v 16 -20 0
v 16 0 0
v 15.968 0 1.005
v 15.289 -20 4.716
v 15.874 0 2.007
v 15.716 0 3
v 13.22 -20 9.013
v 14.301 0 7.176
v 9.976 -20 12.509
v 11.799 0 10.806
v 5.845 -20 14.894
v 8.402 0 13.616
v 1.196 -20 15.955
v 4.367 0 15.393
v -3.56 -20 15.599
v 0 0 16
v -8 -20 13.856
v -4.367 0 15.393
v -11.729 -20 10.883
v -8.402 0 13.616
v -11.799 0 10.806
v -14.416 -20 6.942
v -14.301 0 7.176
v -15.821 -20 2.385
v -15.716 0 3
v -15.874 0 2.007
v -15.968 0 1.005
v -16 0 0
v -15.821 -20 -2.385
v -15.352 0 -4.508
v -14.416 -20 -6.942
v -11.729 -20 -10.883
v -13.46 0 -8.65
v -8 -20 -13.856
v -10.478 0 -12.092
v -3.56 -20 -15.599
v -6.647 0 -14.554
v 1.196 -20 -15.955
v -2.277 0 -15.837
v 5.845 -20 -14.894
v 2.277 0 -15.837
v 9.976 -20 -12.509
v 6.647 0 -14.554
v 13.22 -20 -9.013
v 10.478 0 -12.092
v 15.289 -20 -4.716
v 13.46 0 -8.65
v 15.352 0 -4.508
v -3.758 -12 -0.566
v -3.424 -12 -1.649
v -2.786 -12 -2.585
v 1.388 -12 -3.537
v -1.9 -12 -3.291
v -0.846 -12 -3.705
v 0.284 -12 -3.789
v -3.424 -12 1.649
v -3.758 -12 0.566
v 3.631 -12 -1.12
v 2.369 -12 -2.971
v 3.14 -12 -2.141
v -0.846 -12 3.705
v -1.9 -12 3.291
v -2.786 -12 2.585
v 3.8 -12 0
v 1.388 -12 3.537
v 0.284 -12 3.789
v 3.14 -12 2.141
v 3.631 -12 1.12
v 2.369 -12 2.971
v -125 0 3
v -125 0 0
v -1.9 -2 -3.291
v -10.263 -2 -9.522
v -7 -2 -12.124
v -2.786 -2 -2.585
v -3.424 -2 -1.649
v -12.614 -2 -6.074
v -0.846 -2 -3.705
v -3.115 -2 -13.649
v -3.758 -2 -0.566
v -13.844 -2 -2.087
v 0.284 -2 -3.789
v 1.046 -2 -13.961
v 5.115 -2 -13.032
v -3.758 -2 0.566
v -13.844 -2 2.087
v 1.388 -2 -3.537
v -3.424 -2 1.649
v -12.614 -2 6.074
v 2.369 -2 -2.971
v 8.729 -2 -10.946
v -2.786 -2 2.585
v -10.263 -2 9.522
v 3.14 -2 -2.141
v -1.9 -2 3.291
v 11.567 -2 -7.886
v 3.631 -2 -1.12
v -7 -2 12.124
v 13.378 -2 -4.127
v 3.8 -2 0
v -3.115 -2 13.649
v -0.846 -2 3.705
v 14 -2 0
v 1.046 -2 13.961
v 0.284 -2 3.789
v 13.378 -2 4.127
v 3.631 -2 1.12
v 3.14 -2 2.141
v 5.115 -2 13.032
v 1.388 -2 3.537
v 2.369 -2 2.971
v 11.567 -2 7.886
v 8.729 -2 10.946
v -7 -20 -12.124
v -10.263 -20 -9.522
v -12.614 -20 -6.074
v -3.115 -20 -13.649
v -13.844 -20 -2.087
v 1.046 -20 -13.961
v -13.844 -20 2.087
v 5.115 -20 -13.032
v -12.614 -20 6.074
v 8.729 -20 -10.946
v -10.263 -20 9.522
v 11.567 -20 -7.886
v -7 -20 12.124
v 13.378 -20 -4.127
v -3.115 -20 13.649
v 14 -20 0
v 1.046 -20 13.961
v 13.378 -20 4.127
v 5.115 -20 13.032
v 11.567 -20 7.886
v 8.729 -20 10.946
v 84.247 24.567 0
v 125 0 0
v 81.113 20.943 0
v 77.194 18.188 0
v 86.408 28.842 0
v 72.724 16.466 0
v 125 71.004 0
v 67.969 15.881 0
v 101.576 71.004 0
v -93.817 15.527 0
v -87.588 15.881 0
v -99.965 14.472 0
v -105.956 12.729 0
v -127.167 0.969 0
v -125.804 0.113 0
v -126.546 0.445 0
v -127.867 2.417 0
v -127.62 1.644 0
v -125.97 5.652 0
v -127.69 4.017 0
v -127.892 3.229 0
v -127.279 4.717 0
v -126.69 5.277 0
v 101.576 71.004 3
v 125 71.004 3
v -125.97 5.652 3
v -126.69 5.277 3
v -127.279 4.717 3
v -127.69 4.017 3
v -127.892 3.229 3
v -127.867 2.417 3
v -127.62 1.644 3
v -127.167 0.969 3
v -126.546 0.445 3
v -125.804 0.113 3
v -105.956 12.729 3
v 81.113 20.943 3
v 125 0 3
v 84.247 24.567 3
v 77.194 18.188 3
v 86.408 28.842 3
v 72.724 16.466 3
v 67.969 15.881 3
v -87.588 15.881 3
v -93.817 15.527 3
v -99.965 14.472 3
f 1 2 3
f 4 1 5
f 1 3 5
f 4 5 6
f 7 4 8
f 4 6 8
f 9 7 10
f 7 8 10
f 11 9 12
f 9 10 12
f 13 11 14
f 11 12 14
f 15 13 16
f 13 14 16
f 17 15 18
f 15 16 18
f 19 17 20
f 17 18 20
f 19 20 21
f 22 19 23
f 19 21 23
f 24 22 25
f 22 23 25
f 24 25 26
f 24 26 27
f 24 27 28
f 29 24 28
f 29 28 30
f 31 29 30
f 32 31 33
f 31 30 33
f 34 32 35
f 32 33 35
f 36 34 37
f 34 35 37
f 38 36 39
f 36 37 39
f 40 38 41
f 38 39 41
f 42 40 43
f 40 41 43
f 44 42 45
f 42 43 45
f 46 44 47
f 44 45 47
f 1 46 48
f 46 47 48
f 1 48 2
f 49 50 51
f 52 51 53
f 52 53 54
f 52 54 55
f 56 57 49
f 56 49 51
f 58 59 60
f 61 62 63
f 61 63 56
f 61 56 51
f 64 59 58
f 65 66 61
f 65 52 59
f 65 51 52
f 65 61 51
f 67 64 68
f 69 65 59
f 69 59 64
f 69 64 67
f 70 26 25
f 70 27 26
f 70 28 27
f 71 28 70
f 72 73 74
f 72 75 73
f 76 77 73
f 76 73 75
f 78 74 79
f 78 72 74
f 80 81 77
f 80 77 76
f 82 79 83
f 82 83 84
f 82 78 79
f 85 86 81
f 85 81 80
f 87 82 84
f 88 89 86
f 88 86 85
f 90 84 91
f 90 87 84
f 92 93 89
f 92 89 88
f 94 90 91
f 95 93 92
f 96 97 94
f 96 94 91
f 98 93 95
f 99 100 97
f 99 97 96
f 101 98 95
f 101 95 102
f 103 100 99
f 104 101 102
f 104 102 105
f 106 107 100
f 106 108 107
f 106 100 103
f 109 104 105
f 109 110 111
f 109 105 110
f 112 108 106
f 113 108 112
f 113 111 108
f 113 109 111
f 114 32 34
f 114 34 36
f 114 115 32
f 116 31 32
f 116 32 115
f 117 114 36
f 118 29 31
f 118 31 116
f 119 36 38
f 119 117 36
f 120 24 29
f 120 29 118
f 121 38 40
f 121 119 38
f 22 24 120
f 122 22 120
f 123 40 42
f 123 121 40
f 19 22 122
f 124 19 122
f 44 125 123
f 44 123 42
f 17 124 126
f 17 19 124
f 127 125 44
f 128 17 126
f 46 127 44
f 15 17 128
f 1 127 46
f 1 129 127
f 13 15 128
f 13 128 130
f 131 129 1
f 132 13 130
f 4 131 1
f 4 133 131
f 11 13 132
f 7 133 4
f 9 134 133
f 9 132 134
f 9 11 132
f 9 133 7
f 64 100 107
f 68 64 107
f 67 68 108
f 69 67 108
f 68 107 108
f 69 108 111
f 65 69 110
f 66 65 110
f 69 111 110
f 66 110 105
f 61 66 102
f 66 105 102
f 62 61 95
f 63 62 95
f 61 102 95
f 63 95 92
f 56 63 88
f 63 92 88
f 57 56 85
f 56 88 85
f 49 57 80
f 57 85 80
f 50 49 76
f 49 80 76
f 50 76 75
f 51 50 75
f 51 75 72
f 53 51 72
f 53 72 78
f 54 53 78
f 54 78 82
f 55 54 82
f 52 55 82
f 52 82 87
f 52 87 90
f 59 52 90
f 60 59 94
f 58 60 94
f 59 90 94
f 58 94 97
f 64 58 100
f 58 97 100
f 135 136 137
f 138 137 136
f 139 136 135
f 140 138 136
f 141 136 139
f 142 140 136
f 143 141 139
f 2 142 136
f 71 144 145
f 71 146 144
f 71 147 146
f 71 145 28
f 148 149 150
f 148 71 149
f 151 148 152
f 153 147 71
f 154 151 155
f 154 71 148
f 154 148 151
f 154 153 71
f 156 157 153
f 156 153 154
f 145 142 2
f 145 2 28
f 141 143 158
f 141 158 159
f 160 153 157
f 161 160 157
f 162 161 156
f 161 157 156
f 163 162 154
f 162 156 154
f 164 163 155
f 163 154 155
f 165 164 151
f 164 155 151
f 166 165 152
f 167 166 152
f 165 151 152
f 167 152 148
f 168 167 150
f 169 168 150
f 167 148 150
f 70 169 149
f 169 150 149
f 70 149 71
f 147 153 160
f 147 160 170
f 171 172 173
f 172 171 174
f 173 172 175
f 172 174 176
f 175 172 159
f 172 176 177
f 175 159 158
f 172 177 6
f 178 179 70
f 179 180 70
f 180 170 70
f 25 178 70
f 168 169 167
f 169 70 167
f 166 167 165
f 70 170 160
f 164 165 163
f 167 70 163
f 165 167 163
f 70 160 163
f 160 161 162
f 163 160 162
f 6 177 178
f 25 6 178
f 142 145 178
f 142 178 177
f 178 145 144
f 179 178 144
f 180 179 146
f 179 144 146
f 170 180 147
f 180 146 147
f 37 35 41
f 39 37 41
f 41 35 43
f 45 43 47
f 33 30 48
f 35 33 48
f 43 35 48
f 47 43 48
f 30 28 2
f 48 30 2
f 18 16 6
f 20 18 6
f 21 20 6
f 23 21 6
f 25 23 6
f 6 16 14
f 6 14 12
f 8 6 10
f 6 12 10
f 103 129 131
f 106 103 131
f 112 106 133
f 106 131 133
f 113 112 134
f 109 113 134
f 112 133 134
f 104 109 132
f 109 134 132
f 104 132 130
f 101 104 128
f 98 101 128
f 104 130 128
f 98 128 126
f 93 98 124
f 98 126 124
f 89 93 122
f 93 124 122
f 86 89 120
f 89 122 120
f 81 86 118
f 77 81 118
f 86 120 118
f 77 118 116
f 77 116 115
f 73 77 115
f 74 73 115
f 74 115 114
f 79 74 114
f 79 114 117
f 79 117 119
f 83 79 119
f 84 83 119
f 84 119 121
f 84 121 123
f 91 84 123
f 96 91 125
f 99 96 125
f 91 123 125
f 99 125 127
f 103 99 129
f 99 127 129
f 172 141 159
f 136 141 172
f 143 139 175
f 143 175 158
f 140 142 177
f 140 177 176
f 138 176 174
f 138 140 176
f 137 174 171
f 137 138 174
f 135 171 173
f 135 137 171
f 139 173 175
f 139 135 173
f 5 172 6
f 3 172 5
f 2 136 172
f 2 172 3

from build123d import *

# Parameters (mm, degrees)
PAD_DEPTH    = 3
SKETCH001_R  = 16
PAD001_DEPTH = 20
SKETCH002_R  = 14
POCKET_DEPTH = 18
SKETCH003_R  = 3.8
PAD002_DEPTH = 10


with BuildPart() as part:
    # Sketch → Pad (new body)
    with BuildSketch(Plane.XY):
        with BuildLine():
            Line((-125.969839, 5.652203), (-105.955548, 12.728901))
            ThreePointArc((-87.587906, 15.880533), (-96.90594, 15.08691), (-105.955548, 12.728901))
            Line((-87.587906, 15.880533), (-56.304531, 15.880533))
            Line((-56.304531, 15.880533), (67.96893, 15.880533))
            ThreePointArc((67.96893, 15.880533), (79.23833, 19.445245), (86.407644, 28.842452))
            Line((86.407644, 28.842452), (101.576416, 71.003891))
            Line((101.576416, 71.003891), (125, 71.003891))
            Line((125, 71.003891), (125, 0))
            Line((125, 0), (-125, 0))
            ThreePointArc((-125.969839, 5.652203), (-127.867402, 2.4173), (-125, 0))
        make_face()
    extrude(amount=PAD_DEPTH)

    # Sketch001 (on Face9 of Pad) → Pad001 (join)
    with BuildSketch(Plane.XZ):
        Circle(SKETCH001_R)
    extrude(amount=PAD001_DEPTH)

    # Sketch002 (on Face17 of Pad001) → Pocket (cut)
    with BuildSketch(Plane.XZ.offset(20)):
        Circle(SKETCH002_R)
    extrude(amount=-POCKET_DEPTH, mode=Mode.SUBTRACT)

    # Sketch003 (on Face19 of Pocket) → Pad002 (join)
    with BuildSketch(Plane.XZ.offset(2)):
        Circle(SKETCH003_R)
    extrude(amount=PAD002_DEPTH)


solid = part.part
